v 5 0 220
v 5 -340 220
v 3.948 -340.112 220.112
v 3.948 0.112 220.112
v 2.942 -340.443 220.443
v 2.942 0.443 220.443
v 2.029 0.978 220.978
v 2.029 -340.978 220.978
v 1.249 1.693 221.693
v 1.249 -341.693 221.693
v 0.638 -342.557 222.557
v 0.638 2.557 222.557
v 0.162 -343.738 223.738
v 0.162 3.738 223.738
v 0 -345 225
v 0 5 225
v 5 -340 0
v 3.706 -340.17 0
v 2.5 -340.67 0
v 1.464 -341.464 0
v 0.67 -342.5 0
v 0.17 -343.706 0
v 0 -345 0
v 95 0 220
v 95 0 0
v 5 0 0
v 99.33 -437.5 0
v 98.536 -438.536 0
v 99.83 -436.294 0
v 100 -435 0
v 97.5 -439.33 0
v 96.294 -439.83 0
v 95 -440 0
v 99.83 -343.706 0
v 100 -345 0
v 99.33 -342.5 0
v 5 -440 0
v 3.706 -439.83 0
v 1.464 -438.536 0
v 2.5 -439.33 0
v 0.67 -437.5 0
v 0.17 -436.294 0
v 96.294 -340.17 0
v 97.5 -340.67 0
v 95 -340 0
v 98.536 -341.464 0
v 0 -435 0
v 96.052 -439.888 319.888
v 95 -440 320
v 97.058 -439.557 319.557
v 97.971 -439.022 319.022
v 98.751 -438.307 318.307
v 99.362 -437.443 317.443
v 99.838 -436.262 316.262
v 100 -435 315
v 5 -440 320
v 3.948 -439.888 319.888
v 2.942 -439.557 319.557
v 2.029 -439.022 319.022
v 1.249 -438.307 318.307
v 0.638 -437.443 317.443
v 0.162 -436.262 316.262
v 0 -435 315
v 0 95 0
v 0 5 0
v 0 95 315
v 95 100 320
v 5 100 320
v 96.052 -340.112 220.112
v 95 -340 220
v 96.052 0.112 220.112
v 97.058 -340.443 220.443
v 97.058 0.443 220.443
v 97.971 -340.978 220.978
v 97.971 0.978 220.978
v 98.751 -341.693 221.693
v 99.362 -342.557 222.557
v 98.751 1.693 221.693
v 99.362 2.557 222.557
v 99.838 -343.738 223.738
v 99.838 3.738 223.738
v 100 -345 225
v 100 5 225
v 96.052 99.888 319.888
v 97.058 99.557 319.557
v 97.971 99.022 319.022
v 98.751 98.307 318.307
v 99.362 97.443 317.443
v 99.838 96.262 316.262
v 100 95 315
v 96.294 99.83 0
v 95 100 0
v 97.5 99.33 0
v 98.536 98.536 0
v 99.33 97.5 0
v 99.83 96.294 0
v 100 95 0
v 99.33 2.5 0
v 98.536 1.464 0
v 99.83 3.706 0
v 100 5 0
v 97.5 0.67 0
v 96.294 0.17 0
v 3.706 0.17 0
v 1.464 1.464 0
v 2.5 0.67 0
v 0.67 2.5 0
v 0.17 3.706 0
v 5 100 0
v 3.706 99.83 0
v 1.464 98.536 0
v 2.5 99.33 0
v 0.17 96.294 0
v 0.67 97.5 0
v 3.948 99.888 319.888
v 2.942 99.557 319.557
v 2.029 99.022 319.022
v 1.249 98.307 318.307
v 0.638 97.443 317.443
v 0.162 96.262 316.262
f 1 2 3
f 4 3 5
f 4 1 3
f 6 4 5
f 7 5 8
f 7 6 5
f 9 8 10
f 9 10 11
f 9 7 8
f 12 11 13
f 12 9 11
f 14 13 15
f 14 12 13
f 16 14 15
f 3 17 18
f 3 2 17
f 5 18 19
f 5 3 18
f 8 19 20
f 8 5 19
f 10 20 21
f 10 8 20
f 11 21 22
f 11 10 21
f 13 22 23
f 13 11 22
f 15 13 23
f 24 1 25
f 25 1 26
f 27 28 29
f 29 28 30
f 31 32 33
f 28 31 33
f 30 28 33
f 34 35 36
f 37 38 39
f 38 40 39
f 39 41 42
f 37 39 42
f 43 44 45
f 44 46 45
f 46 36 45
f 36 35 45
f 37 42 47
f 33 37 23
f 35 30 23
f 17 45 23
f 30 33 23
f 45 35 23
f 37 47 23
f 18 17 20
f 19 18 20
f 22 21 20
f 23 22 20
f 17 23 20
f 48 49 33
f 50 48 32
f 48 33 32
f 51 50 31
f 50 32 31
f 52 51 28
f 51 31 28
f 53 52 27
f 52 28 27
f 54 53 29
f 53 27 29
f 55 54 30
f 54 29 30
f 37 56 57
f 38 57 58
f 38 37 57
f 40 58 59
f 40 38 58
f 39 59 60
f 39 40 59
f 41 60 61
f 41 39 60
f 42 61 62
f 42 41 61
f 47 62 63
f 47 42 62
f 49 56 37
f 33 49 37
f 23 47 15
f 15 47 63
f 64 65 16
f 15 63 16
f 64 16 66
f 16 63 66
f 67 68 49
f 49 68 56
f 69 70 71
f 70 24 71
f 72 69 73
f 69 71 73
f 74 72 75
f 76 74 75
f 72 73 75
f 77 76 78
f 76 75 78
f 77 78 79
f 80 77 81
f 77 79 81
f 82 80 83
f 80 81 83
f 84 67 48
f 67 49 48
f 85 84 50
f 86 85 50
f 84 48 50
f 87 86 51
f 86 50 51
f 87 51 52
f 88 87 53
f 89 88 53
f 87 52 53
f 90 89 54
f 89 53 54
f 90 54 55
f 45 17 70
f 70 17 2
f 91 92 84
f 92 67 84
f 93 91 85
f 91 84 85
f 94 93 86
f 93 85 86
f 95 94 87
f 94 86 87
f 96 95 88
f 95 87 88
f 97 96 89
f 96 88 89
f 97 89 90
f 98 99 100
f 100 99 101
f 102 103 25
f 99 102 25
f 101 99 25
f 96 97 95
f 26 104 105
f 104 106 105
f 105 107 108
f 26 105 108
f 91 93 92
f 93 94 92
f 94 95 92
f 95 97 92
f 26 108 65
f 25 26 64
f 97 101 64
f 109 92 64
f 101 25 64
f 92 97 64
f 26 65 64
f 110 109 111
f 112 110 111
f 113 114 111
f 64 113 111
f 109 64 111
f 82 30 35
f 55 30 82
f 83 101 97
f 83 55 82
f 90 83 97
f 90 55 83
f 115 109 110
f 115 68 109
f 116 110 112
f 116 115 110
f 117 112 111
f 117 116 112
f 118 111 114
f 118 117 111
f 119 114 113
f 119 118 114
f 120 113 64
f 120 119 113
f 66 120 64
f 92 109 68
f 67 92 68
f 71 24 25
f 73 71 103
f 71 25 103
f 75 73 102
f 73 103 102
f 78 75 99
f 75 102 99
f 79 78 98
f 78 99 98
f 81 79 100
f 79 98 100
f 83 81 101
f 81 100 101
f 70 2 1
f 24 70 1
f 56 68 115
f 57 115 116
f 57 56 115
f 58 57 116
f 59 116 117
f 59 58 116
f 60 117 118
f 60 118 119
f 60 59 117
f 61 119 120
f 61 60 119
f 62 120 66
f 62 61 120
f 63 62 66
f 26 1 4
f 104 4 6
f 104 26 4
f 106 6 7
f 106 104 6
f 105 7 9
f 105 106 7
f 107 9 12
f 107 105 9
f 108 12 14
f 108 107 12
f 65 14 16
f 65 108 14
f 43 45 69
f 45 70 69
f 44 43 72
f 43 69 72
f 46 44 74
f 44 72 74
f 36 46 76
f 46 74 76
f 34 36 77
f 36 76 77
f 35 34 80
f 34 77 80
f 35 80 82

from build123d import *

# Parameters (mm, degrees)
F1_DEPTH = 100
F2_R     = 5


with BuildPart() as f1:
    # F0 (on Right) → F1 (new body)
    with BuildSketch(Plane.YZ):
        Polygon((0, 220), (0, 0), (100, 0), (100, 320), (-440, 320), (-440, 0), (-340, 0), (-340, 220), align=None)
    extrude(amount=F1_DEPTH)

    # F2
    f2_edges = [f1.edges().sort_by_distance(p)[0] for p in [
        (100, -440, 160),
        (100, -340, 110),
        (100, -170, 220),
        (100, 0, 110),
        (100, 100, 160),
        (0, -440, 160),
        (0, 0, 110),
        (0, -170, 220),
        (0, -340, 110),
        (0, 100, 160),
        (0, -170, 320),
        (100, -170, 320),
    ]]
    fillet(f2_edges, radius=F2_R)


solid = f1.part
